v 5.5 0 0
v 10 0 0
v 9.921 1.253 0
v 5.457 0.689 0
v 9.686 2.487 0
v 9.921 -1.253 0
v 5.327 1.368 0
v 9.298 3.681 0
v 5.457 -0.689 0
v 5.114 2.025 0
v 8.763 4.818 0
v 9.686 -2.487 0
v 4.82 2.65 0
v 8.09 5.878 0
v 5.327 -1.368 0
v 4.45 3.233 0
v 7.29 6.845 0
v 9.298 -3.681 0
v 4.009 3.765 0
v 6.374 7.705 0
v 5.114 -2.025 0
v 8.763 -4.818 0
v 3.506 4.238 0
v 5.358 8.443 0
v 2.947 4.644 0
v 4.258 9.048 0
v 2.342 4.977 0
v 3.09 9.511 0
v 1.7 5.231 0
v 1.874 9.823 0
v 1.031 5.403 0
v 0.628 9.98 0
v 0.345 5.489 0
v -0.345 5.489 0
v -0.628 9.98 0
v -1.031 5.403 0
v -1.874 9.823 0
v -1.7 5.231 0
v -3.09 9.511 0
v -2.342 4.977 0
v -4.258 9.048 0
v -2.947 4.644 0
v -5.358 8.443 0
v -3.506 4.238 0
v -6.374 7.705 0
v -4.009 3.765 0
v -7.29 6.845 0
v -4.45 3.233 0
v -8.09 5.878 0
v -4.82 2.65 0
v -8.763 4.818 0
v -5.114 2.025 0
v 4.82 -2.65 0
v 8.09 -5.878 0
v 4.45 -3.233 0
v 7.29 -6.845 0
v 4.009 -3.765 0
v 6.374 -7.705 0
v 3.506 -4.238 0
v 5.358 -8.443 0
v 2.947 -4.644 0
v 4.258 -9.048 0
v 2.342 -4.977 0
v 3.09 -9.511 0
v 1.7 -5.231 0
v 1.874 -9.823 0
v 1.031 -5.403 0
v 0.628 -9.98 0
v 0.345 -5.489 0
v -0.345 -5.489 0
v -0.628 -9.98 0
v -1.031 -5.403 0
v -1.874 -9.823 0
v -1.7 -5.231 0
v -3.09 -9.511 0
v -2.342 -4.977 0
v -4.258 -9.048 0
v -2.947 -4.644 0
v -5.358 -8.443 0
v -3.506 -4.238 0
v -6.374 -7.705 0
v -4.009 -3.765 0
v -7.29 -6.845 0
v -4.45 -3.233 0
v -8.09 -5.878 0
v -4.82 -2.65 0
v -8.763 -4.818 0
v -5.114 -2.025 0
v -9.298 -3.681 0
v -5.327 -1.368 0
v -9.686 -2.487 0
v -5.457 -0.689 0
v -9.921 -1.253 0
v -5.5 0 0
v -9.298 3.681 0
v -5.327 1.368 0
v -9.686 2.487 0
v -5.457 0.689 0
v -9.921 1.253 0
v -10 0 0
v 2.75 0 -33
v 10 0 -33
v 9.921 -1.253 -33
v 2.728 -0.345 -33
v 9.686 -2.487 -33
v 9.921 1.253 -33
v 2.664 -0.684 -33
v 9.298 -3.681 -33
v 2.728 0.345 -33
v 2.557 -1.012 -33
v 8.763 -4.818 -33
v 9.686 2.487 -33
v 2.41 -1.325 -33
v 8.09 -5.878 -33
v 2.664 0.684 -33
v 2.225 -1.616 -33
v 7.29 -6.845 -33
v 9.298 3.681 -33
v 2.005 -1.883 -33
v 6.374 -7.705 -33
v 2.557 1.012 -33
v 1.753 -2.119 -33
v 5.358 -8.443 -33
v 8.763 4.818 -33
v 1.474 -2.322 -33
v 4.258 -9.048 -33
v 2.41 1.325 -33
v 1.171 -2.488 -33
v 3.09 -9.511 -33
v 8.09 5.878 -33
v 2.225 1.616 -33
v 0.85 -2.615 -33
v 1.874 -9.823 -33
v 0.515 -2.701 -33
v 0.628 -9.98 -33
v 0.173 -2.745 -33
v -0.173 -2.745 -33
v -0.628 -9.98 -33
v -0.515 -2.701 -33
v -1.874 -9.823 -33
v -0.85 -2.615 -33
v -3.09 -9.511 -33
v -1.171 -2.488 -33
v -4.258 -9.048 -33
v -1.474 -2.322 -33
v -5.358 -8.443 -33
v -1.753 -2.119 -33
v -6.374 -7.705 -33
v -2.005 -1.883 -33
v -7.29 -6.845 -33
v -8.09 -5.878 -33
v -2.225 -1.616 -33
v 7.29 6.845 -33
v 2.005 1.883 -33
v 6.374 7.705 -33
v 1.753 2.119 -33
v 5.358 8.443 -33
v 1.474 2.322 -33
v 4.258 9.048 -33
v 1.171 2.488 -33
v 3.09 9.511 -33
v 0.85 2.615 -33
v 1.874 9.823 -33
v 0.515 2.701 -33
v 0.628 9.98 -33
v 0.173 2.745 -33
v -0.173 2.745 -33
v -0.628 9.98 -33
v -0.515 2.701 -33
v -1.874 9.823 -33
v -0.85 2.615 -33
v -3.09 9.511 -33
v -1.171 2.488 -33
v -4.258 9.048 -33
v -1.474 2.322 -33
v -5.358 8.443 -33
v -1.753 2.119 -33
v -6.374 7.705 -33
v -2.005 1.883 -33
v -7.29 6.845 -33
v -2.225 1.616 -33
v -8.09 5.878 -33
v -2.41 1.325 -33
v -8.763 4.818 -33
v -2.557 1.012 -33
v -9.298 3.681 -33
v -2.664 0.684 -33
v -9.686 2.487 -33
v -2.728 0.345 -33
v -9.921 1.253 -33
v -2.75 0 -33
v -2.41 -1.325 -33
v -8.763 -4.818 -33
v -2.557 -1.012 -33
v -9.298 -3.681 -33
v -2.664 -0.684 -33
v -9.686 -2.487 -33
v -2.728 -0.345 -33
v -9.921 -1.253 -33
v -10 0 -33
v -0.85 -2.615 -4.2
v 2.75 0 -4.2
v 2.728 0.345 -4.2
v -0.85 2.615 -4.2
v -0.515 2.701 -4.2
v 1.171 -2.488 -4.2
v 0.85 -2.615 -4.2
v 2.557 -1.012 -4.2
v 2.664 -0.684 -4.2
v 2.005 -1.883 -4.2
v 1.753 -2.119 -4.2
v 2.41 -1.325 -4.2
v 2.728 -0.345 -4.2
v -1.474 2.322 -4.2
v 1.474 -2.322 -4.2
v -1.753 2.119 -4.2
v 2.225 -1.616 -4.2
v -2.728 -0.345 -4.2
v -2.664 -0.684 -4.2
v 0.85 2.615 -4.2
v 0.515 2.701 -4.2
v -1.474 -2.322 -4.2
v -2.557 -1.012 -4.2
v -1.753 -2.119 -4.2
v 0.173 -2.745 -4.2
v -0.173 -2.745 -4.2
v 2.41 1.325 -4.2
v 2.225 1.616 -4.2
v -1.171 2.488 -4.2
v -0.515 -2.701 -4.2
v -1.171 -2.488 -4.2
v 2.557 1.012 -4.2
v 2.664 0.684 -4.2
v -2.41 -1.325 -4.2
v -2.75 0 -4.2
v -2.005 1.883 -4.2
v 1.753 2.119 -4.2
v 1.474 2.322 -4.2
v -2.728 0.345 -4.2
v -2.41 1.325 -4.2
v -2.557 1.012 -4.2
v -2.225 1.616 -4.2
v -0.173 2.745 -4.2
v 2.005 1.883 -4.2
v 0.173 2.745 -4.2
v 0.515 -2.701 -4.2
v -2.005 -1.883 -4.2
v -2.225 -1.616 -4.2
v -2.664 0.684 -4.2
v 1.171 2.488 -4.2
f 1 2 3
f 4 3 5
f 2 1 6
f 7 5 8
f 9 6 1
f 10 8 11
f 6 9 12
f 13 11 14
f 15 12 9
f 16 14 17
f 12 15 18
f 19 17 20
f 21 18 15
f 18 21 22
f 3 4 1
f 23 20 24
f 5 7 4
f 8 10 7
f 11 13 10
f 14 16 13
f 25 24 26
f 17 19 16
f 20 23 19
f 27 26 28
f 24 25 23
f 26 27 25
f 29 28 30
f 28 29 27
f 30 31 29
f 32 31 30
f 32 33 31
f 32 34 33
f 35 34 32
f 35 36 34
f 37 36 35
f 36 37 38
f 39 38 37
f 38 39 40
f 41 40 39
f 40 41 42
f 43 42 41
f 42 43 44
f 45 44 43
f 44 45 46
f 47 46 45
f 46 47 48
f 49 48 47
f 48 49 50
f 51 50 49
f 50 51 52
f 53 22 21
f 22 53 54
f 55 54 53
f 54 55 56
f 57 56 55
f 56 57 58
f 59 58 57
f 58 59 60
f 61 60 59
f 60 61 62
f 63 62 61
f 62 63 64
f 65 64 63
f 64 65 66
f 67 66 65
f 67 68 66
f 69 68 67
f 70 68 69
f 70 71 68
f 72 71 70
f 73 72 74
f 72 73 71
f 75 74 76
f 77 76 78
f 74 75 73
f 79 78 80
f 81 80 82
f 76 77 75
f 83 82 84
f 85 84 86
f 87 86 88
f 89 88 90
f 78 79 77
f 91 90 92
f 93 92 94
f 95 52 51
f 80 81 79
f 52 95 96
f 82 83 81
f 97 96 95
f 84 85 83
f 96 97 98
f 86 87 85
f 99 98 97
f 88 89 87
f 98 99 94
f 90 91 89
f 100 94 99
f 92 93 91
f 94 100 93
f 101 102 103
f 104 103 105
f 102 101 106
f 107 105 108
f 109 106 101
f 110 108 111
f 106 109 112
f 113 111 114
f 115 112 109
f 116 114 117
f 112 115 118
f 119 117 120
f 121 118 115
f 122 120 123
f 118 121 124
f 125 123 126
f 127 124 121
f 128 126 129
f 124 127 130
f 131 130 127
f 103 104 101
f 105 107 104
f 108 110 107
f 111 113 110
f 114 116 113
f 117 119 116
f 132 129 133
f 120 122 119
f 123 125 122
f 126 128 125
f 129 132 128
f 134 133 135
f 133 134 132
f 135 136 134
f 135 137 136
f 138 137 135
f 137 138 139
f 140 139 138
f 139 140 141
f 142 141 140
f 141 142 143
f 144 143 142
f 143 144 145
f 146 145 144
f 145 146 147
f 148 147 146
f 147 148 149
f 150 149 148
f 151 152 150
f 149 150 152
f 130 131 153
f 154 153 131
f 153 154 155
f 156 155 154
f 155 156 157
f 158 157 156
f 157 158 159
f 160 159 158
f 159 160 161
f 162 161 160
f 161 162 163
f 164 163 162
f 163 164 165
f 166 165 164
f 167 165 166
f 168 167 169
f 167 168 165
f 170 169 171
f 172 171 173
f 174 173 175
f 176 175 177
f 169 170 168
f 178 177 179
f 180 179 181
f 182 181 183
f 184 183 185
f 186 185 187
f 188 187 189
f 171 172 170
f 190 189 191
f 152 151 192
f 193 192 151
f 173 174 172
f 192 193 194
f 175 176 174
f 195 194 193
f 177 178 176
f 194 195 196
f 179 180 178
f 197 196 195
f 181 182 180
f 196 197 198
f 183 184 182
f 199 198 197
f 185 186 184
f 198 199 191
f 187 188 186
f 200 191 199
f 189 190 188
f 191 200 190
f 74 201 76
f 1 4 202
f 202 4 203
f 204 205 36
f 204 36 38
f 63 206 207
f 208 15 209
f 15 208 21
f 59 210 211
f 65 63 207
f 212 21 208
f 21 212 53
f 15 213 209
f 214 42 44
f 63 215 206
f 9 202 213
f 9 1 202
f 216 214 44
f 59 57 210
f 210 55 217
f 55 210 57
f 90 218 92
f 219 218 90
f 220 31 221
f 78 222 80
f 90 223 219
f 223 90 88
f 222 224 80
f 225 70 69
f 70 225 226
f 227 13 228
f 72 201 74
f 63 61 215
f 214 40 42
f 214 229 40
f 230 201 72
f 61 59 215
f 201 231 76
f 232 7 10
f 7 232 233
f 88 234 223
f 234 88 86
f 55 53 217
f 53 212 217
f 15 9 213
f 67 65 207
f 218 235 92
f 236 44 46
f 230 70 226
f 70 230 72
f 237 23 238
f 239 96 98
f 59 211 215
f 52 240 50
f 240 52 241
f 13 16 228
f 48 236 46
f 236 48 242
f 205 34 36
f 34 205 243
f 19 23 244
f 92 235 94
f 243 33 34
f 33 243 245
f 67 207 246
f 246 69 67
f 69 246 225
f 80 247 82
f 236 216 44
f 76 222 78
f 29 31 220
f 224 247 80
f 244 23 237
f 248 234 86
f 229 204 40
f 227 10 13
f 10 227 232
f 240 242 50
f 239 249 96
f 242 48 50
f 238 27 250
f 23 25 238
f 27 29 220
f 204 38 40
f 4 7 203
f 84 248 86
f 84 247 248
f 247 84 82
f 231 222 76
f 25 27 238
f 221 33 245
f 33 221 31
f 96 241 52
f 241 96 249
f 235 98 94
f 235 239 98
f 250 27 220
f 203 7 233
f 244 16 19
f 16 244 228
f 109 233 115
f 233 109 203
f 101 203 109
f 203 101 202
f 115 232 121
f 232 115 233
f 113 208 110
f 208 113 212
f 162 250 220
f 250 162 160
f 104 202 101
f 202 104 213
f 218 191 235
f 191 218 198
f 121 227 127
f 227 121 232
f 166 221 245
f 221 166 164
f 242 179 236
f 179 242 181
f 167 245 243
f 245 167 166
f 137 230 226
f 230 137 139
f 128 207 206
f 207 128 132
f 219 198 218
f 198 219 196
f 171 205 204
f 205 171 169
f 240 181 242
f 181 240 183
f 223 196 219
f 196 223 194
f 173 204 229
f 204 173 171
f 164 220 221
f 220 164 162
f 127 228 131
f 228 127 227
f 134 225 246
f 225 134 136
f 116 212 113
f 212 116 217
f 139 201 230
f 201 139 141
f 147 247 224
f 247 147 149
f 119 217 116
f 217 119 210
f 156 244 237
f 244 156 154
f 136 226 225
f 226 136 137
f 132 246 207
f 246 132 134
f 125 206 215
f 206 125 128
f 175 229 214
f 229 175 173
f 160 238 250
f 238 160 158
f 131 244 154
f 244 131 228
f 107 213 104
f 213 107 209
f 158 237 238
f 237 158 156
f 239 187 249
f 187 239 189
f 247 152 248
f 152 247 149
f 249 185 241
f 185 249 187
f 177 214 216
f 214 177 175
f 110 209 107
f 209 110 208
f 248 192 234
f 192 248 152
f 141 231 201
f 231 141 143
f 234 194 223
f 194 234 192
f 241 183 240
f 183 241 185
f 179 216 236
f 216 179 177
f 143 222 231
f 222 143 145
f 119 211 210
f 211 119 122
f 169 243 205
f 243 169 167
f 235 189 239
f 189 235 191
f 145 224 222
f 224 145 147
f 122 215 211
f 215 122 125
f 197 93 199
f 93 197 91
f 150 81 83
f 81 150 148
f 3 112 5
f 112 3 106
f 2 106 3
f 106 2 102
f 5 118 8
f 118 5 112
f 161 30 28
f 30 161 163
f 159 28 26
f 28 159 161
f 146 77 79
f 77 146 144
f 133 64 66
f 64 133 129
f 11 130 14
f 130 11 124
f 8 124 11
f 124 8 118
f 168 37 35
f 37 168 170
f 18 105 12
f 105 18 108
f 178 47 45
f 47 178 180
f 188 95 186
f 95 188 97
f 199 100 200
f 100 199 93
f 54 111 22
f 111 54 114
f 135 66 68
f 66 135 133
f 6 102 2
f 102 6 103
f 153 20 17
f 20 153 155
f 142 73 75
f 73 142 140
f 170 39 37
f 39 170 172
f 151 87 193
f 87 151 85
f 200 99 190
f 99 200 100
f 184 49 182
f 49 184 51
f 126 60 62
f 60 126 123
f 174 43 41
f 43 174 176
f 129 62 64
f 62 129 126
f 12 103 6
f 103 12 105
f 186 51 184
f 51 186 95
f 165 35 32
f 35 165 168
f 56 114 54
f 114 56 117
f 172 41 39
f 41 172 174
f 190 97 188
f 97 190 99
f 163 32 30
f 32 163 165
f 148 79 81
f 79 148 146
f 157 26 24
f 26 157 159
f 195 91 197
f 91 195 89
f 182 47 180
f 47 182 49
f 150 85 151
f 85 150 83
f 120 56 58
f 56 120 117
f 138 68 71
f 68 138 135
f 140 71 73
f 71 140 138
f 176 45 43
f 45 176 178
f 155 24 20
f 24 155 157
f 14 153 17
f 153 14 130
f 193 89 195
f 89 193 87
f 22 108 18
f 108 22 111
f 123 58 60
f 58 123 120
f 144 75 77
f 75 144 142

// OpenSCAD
$fn = 50;


difference() {
	union() {
		translate(v = [0, 0, -33.0000000000]) {
			cylinder(h = 33, r = 10.0000000000);
		}
		cylinder(h = 0, r = 16.0000000000);
	}
	union() {
		translate(v = [0, 0, 0]) {
			rotate(a = [0, 0, 0]) {
				difference() {
					union() {
						#translate(v = [0, 0, -33.0000000000]) {
							cylinder(h = 33, r = 2.2500000000);
						}
						#translate(v = [0, 0, -4.2000000000]) {
							cylinder(h = 4.2000000000, r = 10.0000000000, r1 = 2.7500000000, r2 = 5.5000000000);
						}
						#translate(v = [0, 0, -33.0000000000]) {
							cylinder(h = 33, r = 2.7500000000);
						}
						#translate(v = [0, 0, -33.0000000000]) {
							cylinder(h = 33, r = 2.2500000000);
						}
					}
					union();
				}
			}
		}
	}
}
